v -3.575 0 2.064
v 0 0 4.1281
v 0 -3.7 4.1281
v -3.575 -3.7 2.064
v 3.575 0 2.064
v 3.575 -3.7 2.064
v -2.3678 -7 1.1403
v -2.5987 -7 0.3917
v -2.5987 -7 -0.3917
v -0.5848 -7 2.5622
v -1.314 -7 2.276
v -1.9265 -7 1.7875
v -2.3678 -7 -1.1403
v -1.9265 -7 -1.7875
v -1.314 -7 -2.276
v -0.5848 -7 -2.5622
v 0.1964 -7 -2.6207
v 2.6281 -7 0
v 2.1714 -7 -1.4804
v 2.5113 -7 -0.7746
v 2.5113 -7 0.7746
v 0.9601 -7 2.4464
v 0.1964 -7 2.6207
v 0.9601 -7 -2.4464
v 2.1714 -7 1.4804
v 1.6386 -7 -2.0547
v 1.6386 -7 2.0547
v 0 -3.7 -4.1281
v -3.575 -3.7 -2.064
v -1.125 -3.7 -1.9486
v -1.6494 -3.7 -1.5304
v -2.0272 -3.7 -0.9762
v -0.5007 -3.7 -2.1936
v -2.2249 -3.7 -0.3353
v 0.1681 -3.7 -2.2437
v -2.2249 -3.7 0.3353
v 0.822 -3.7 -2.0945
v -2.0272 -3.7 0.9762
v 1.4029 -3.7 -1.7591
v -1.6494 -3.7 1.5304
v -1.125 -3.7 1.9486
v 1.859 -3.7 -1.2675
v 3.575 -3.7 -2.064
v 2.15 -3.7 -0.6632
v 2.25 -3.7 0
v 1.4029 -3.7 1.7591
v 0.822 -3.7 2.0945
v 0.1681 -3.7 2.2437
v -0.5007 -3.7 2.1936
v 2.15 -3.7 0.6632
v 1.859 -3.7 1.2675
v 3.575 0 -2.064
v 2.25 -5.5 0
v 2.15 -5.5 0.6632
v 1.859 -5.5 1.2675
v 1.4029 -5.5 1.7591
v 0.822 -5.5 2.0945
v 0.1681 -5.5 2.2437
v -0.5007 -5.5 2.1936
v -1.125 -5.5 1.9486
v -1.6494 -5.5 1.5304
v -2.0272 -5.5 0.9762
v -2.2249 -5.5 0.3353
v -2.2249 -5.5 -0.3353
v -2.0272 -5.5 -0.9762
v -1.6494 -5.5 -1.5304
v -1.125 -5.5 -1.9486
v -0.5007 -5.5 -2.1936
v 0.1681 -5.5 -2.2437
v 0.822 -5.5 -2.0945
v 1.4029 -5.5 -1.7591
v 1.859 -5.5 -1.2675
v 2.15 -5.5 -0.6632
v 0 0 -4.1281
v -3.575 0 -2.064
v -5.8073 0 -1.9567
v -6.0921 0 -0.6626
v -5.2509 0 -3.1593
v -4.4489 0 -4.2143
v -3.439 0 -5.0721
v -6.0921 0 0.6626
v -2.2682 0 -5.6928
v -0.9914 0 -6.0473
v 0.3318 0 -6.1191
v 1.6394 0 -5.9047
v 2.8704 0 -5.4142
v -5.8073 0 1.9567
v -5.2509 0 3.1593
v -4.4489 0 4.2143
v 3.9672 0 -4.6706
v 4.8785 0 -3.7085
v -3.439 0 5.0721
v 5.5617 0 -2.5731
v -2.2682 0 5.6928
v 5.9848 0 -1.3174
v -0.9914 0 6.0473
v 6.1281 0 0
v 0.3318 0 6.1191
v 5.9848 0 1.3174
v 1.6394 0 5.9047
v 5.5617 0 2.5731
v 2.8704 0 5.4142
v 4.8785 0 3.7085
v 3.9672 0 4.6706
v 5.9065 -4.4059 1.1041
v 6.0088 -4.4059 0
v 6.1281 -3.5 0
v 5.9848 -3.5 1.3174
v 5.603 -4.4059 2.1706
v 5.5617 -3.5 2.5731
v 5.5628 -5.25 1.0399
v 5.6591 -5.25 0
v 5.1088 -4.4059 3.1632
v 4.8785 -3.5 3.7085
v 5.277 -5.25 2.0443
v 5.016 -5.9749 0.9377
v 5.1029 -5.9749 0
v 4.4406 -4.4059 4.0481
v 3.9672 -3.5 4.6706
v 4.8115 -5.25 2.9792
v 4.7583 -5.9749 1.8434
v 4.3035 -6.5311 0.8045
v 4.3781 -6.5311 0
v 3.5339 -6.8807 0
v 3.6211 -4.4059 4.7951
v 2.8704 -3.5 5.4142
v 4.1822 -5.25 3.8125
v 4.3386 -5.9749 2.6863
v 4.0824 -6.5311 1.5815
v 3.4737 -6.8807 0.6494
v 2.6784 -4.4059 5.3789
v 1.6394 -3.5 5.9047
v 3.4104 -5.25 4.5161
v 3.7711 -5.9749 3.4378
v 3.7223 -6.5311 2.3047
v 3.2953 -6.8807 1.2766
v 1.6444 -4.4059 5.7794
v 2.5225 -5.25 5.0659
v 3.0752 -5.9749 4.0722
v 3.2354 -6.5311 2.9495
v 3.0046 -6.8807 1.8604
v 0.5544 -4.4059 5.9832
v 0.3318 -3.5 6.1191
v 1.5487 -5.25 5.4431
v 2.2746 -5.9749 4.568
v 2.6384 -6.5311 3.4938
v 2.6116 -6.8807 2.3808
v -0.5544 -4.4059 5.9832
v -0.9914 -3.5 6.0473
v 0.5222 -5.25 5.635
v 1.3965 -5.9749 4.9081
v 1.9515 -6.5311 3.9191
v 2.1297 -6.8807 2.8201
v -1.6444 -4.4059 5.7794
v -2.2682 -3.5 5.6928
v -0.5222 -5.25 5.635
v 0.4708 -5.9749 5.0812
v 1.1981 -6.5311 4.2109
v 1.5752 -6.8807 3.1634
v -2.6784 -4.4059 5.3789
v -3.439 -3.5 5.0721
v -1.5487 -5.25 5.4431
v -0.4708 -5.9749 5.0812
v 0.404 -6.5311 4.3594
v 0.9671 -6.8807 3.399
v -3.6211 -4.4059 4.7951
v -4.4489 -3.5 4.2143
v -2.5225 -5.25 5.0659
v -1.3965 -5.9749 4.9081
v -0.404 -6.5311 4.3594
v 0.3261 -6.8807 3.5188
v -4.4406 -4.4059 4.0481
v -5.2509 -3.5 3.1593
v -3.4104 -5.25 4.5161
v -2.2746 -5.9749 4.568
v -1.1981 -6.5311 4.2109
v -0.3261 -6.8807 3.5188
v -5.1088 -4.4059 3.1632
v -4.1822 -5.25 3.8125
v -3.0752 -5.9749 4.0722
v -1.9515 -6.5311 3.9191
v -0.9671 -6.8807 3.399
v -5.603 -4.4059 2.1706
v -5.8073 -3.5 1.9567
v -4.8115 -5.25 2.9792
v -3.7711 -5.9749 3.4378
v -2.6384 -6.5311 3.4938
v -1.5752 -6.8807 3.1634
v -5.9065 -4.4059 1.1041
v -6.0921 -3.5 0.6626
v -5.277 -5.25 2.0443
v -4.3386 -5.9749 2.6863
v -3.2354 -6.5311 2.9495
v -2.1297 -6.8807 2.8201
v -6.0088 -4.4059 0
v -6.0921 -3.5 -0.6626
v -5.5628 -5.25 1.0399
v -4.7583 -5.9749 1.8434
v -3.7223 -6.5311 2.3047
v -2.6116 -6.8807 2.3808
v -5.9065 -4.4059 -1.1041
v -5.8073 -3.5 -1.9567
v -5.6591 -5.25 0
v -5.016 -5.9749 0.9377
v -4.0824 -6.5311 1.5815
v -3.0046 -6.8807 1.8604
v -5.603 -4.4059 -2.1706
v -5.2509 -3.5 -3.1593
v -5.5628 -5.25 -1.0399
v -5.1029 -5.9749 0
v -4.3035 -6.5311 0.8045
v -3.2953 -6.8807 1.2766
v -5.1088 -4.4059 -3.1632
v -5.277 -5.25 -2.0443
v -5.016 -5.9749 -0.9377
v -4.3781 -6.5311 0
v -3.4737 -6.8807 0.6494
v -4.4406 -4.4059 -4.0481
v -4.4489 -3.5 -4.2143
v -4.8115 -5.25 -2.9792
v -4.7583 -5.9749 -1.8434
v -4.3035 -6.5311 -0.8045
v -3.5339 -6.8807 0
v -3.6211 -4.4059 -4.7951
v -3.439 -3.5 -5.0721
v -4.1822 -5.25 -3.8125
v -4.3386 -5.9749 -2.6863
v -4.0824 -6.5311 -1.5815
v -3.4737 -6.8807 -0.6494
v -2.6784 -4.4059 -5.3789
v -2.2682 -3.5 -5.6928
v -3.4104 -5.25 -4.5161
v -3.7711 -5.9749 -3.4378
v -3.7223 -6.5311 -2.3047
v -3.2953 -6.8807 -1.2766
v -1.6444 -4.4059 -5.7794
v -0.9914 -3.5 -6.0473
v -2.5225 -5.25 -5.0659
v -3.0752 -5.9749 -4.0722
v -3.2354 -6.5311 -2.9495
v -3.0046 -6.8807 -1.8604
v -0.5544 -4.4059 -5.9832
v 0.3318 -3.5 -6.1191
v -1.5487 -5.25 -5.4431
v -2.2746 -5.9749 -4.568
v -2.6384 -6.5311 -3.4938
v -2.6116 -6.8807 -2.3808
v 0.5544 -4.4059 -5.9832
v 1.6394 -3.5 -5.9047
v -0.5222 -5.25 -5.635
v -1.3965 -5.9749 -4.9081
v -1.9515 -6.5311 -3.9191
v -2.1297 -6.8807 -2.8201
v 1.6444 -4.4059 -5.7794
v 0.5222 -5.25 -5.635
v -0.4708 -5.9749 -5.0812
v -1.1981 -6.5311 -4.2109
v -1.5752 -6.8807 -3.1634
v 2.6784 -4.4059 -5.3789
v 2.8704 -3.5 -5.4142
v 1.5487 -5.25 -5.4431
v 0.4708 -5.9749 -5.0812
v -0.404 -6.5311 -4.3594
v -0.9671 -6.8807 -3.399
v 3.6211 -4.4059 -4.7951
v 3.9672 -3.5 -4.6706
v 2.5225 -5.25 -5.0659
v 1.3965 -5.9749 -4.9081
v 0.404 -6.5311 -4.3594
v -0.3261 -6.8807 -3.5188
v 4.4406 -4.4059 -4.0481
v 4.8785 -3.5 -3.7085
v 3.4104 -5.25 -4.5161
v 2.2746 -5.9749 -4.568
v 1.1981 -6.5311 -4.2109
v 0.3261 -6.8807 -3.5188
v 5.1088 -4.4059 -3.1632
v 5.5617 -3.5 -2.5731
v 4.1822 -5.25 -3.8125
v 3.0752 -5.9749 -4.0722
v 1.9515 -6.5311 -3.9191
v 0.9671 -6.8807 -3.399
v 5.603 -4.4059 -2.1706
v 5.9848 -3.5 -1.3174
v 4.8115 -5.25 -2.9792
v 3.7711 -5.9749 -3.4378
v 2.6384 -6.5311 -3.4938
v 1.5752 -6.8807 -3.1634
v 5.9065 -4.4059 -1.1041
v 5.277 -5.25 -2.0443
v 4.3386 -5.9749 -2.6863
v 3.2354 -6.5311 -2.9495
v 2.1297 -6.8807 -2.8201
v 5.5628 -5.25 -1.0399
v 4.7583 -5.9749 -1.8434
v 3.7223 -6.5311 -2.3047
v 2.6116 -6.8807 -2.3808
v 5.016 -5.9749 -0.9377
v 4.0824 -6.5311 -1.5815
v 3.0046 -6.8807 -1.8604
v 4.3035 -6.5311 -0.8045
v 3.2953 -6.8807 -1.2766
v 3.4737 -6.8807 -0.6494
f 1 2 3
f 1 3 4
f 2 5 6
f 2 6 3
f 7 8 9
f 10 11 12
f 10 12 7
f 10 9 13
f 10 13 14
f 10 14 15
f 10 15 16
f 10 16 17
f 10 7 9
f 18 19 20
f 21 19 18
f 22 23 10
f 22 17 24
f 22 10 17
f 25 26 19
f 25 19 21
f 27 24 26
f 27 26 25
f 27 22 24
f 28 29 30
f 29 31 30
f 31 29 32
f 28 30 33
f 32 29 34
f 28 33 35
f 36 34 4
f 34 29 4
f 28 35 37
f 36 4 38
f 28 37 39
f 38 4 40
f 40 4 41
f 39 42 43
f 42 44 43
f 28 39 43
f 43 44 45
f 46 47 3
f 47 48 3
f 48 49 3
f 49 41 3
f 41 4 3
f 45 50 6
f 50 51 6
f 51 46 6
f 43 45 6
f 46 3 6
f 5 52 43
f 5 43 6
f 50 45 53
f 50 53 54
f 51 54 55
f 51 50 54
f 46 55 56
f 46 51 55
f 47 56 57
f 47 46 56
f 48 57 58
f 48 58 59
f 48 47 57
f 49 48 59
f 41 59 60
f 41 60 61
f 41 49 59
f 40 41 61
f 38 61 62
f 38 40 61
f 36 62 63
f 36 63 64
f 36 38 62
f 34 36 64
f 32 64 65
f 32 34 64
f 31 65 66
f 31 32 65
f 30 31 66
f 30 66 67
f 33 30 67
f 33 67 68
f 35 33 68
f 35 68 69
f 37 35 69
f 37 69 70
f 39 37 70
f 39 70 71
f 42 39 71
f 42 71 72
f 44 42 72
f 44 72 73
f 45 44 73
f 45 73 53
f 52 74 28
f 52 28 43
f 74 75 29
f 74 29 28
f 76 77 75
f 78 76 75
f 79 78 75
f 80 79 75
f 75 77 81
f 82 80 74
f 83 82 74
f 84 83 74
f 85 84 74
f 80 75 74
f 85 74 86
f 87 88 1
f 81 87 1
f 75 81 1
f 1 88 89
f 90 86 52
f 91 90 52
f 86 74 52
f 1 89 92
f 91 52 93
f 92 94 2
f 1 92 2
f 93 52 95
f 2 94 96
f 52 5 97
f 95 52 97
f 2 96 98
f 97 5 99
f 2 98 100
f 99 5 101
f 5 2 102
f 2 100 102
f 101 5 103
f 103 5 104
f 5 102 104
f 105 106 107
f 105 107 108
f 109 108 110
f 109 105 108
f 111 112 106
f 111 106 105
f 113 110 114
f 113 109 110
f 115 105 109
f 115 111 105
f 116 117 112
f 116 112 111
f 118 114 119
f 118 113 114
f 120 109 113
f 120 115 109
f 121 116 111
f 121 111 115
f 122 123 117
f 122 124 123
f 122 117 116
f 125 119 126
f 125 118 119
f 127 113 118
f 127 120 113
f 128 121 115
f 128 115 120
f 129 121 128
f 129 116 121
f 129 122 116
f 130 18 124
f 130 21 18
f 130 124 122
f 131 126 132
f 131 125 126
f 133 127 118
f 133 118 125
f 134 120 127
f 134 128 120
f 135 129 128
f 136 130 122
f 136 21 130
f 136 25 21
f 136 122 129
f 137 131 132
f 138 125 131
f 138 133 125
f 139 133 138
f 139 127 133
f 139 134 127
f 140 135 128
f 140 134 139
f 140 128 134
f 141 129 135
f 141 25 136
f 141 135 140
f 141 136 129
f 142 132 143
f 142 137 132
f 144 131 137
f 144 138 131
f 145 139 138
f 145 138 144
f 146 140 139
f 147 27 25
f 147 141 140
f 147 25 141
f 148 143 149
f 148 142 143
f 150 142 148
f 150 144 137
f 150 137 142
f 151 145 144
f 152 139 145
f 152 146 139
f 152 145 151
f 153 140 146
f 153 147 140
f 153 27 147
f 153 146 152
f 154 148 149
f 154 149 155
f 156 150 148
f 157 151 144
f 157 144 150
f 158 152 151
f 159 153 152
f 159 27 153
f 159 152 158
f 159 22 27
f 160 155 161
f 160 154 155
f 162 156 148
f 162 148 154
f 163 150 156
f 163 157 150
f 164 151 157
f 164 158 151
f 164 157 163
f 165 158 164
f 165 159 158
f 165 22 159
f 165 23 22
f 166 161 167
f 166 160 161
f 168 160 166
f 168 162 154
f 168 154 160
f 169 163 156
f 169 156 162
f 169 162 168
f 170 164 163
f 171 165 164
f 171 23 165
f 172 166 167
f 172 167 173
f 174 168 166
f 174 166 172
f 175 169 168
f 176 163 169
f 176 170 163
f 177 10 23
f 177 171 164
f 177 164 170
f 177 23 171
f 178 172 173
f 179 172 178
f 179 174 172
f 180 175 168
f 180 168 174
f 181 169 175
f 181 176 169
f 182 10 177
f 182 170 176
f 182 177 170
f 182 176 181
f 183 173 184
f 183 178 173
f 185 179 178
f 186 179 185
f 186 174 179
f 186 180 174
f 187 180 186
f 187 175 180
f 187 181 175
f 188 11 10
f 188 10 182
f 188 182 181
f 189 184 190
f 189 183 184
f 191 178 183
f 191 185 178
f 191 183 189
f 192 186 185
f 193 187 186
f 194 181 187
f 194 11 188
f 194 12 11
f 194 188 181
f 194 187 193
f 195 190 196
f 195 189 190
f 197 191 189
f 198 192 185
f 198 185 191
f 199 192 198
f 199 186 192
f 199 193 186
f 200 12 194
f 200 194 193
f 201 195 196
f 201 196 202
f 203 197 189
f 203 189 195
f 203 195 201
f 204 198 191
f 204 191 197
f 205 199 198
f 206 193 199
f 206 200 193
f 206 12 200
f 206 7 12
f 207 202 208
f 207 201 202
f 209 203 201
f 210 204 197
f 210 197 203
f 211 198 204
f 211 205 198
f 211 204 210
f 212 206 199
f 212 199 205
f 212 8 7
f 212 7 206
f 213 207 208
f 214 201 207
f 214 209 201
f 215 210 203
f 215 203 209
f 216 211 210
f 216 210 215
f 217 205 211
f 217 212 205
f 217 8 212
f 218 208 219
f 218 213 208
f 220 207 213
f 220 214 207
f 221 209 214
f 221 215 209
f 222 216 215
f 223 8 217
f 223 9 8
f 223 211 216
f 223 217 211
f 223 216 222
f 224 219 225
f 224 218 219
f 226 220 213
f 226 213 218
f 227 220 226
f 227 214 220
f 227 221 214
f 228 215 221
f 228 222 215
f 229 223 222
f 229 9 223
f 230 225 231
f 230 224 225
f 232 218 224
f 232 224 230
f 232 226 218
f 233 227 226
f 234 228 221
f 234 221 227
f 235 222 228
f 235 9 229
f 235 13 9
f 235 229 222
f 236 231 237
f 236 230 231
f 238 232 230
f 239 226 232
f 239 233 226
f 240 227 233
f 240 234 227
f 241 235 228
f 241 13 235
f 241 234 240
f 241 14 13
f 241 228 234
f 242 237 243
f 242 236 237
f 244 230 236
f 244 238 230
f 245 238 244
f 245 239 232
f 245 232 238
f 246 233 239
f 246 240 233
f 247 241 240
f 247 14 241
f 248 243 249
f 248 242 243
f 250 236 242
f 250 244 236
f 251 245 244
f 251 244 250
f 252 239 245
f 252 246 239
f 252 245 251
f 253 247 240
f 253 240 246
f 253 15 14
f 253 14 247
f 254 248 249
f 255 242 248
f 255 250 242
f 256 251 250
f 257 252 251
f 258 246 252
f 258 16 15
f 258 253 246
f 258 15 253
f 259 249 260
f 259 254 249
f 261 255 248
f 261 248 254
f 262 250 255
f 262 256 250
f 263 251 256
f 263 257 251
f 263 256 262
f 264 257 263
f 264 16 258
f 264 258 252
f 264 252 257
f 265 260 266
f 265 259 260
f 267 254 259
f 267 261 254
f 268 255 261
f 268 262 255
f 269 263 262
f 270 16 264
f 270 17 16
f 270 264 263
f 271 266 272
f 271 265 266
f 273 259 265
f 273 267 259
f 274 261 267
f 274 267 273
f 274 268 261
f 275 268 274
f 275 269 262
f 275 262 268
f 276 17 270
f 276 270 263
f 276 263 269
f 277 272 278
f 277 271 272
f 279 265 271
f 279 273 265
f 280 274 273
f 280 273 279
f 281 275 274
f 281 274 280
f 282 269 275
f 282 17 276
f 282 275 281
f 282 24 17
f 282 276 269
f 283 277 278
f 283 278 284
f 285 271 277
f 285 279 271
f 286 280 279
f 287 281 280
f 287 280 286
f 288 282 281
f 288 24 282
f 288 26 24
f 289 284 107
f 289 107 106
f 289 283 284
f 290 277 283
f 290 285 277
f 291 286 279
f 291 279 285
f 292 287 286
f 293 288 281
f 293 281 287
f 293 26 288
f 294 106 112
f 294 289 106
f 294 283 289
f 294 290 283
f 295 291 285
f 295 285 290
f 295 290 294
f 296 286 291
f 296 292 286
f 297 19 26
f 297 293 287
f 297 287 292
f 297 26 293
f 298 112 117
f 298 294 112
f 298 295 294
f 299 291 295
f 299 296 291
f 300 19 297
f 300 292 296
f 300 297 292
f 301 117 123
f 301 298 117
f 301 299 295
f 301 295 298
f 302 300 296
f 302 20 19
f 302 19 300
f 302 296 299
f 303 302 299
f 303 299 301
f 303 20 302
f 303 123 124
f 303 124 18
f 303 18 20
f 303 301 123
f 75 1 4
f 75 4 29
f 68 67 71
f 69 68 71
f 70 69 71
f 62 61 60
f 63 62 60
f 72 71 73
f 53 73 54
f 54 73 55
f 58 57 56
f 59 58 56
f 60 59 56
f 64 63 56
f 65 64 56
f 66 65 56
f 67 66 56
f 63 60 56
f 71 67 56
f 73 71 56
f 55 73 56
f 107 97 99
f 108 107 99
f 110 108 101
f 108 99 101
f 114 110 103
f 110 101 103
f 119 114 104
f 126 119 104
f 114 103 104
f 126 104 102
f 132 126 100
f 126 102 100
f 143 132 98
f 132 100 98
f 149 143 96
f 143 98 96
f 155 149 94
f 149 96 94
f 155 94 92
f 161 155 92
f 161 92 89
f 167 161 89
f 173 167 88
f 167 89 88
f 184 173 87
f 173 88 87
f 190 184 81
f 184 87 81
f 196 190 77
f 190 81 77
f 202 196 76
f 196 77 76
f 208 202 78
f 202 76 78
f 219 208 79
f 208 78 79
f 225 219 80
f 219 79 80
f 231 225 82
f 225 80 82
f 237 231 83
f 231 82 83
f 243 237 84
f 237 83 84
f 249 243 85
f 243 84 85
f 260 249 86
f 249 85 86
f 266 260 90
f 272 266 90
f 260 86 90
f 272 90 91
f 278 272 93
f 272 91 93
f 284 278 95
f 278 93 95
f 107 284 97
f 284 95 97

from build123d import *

# Parameters (mm, degrees)
F0_R     = 6.128054
F0_R_2   = 2.25
F1_DEPTH = 7
F2_DEPTH = 5.5
F3_DEPTH = 3.7
F4_R     = 3.5


with BuildPart() as f1:
    # F0 (on Front) → F1 (new body)
    with BuildSketch(Plane.XZ):
        Circle(F0_R)
        Polygon((3.575, 2.064027), (3.575, -2.064027), (0, -4.128054), (-3.575, -2.064027), (-3.575, 2.064027), (0, 4.128054), align=None, mode=Mode.SUBTRACT)
        Polygon((0, -4.128054), (3.575, -2.064027), (3.575, 2.064027), (0, 4.128054), (-3.575, 2.064027), (-3.575, -2.064027), align=None)
        Circle(F0_R_2, mode=Mode.SUBTRACT)
        Circle(F0_R_2)
    extrude(amount=F1_DEPTH)

    # F0 (on Front) → F2 (cut)
    with BuildSketch(Plane.XZ):
        Circle(F0_R_2)
    extrude(amount=F2_DEPTH, mode=Mode.SUBTRACT)

    # F0 (on Front) → F3 (cut)
    with BuildSketch(Plane.XZ):
        Polygon((0, -4.128054), (3.575, -2.064027), (3.575, 2.064027), (0, 4.128054), (-3.575, 2.064027), (-3.575, -2.064027), align=None)
        Circle(F0_R_2, mode=Mode.SUBTRACT)
    extrude(amount=F3_DEPTH, mode=Mode.SUBTRACT)

    # F4
    f4_edges = [f1.edges().sort_by_distance(p)[0] for p in [
        (-6.128054, -7, 0),
    ]]
    fillet(f4_edges, radius=F4_R)


solid = f1.part
